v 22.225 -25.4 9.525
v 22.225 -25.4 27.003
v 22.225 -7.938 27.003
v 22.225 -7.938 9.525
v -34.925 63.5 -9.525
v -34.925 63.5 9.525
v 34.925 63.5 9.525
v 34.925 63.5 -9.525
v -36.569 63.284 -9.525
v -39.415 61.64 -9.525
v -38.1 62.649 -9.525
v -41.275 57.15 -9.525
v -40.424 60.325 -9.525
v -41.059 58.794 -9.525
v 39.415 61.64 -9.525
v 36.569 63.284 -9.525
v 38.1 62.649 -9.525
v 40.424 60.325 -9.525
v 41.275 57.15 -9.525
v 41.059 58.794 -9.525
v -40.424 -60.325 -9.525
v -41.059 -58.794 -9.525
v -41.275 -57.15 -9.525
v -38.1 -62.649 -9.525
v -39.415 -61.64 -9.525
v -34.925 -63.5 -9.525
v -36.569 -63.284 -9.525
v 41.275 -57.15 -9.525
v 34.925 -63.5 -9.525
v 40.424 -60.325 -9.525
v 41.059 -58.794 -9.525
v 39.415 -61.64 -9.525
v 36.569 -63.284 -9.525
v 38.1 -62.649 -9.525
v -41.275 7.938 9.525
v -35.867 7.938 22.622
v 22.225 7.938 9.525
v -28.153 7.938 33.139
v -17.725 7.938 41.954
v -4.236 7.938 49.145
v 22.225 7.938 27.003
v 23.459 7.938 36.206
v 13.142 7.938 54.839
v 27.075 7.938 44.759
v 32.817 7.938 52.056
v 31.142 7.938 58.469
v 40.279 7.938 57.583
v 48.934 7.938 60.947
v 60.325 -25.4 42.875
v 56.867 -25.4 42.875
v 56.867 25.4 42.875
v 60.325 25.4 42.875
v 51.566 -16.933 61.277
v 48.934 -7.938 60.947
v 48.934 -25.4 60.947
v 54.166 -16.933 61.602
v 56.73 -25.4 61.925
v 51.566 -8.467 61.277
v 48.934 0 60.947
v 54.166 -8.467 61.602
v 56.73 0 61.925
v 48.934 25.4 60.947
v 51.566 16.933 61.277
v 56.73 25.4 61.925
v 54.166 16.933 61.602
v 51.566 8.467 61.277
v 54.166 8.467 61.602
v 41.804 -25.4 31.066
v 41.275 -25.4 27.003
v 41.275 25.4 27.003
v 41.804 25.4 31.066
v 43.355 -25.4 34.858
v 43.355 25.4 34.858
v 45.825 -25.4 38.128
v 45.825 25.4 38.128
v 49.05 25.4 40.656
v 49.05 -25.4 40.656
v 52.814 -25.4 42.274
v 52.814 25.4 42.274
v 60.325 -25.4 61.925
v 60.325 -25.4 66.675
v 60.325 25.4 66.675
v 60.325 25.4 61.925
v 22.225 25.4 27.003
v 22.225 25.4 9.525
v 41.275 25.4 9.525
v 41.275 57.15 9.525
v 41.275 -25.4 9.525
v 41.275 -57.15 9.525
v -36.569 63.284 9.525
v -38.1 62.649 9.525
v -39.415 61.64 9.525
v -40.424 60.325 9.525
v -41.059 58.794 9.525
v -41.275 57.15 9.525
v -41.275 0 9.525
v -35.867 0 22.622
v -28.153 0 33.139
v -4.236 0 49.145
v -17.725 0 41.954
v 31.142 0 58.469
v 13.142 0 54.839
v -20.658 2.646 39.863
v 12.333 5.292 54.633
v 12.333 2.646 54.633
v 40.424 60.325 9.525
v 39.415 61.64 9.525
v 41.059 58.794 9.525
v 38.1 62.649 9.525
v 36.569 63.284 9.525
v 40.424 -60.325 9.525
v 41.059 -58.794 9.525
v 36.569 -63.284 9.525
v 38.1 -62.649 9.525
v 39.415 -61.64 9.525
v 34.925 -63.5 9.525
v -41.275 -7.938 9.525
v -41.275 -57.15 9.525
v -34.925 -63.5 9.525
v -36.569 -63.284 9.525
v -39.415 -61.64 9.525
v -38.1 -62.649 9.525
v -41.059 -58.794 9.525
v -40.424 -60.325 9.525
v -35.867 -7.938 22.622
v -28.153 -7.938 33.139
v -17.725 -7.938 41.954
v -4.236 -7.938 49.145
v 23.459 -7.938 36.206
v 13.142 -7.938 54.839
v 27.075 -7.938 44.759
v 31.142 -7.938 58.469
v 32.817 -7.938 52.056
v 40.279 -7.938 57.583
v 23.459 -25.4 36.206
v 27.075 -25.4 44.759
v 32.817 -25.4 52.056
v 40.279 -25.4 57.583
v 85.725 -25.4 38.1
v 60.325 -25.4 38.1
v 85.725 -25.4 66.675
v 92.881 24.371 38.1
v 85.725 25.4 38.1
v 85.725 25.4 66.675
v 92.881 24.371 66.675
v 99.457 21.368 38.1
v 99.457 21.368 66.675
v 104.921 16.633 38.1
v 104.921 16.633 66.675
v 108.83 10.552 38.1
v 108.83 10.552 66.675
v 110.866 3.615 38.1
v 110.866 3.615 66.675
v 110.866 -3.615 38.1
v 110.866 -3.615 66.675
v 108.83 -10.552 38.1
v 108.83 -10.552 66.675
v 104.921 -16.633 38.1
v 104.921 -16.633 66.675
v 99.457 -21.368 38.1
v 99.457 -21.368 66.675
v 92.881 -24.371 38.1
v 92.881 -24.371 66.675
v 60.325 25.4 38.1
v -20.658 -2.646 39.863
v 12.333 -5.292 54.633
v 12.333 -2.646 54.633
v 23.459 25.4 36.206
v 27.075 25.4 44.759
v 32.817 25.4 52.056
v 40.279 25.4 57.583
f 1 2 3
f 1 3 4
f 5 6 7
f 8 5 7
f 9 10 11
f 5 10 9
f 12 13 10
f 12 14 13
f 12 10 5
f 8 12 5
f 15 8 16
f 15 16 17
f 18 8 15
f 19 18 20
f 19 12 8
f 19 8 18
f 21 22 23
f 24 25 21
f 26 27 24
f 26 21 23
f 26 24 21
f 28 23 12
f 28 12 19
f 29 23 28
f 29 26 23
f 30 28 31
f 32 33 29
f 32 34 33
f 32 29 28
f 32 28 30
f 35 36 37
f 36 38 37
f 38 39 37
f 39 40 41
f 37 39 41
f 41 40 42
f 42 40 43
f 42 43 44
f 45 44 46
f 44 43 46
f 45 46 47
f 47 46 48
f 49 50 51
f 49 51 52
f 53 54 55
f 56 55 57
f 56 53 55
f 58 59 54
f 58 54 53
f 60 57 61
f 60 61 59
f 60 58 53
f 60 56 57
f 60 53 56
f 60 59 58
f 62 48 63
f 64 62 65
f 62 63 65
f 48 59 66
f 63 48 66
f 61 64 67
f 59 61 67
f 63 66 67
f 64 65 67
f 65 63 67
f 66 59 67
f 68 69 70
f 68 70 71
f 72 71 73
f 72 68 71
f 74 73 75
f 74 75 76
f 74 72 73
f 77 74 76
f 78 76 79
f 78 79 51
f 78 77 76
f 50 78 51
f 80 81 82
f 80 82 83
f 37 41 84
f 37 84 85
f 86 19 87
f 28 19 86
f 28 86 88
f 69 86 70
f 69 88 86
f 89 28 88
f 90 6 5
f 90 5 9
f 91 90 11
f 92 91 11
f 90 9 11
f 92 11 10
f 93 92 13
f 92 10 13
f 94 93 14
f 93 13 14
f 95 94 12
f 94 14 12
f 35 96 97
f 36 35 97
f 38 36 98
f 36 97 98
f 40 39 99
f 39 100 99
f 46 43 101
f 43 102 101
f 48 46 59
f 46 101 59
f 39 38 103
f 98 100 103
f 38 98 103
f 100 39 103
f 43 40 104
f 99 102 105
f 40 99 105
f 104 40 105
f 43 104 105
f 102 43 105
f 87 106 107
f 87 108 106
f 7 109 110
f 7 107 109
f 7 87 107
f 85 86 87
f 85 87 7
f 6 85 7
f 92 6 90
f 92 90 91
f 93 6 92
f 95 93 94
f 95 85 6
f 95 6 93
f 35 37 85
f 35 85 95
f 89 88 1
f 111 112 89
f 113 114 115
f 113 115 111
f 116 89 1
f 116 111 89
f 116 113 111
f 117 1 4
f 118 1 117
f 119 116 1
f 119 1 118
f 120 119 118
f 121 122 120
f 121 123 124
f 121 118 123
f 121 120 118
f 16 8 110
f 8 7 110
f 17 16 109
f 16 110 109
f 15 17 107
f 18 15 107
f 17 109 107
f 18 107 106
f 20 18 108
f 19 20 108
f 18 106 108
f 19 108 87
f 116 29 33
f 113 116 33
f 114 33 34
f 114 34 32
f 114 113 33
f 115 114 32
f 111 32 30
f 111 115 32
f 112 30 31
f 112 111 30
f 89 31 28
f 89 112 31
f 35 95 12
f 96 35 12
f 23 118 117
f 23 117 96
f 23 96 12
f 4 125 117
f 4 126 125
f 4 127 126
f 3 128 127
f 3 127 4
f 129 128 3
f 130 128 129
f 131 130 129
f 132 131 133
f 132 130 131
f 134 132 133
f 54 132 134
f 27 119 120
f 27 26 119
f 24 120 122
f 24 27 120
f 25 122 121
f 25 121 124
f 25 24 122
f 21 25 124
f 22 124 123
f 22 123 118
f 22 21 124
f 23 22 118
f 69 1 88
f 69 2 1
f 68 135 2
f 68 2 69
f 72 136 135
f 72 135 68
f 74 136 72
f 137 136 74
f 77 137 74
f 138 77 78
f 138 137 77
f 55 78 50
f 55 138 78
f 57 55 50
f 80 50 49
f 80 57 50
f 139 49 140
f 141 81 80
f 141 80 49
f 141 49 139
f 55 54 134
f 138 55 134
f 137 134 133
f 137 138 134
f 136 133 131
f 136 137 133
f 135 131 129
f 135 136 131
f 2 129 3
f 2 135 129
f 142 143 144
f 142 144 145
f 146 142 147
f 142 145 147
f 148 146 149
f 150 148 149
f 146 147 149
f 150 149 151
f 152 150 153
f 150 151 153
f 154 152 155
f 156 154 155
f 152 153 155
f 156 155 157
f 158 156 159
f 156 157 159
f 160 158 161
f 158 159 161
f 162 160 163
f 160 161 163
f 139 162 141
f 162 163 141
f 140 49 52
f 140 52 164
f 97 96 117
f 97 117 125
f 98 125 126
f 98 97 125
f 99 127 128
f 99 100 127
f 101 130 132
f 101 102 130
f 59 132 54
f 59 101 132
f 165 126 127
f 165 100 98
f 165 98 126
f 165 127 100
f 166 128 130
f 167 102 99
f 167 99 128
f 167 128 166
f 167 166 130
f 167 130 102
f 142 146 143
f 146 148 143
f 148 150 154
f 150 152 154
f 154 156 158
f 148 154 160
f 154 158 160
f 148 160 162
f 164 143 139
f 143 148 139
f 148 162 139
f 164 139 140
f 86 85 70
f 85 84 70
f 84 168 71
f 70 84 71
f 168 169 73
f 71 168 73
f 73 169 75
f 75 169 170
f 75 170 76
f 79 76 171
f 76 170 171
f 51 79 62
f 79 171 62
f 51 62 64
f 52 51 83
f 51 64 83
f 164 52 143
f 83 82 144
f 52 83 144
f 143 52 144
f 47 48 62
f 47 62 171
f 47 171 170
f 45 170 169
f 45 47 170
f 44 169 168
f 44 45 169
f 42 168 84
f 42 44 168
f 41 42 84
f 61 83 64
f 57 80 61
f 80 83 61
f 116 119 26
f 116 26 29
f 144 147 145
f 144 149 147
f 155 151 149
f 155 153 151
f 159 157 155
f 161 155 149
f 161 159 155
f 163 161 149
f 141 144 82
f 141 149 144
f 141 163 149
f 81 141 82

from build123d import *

# Parameters (mm, degrees)
F1_DEPTH = 63.5
F2_DEPTH = 25.4
F3_DEPTH = 7.9375
F0_W     = 25.4
F0_H     = 28.575
F5_R     = 6.35


with BuildPart() as f1:
    # F0 (on Front) → F1 (new body, symmetric)
    with BuildSketch(Plane.XZ):
        Polygon((41.275, -9.525), (41.275, 9.525), (22.225, 9.525), (-41.275, 9.525), (-41.275, -9.525), align=None)
    extrude(amount=F1_DEPTH, both=True)

    # F0 (on Front) → F2 (join, symmetric)
    with BuildSketch(Plane.XZ):
        with BuildLine():
            Line((22.225, 9.525), (41.275, 9.525))
            Line((41.275, 9.525), (41.275, 27.00272))
            ThreePointArc((41.275, 27.00272), (45.825119, 38.127588), (56.867151, 42.8752))
            Line((56.867151, 42.8752), (60.325, 42.8752))
            Line((60.325, 42.8752), (60.325, 61.9252))
            Line((60.325, 61.9252), (56.730458, 61.9252))
            add(Edge.make_bspline(
                [(48.933699, 60.947499), (51.581091, 61.280162), (54.185468, 61.601631), (56.730458, 61.9252)],
                knots=[103.418833, 103.418833, 103.418833, 103.418833, 111.134381, 111.134381, 111.134381, 111.134381], degree=3))
            ThreePointArc((48.933699, 60.947499), (29.702687, 48.599031), (22.225, 27.00272))
            Line((22.225, 27.00272), (22.225, 9.525))
        make_face()
        Polygon((60.325, 61.9252), (60.325, 42.8752), (60.325, 38.1), (85.725, 38.1), (85.725, 66.675), (60.325, 66.675), align=None)
    extrude(amount=F2_DEPTH, both=True)

    # F0 (on Front) → F3 (join, symmetric)
    with BuildSketch(Plane.XZ):
        with BuildLine():
            Line((-41.275, 9.525), (22.225, 9.525))
            Line((22.225, 9.525), (22.225, 27.00272))
            ThreePointArc((22.225, 27.00272), (29.702687, 48.599031), (48.933699, 60.947499))
            add(Edge.make_bspline(
                [(-41.275, 9.525), (-29.76549, 50.018415), (13.44819, 56.488502), (48.933699, 60.947499)],
                knots=[0, 0, 0, 0, 103.418833, 103.418833, 103.418833, 103.418833], degree=3))
        make_face()
    extrude(amount=F3_DEPTH, both=True)

    # F0 (on Front) → F4 (revolve)
    with BuildSketch(Plane.XZ):
        with Locations((98.425, 52.3875)):
            Rectangle(F0_W, F0_H)
    revolve(axis=Axis((85.725, 0, 52.3875), (0, 0, -1)))

    # F5
    f5_edges = [f1.edges().sort_by_distance(p)[0] for p in [
        (-41.275, -63.5, 0),
        (41.275, -63.5, 0),
        (41.275, 63.5, 0),
        (-41.275, 63.5, 0),
    ]]
    fillet(f5_edges, radius=F5_R)


solid = f1.part
